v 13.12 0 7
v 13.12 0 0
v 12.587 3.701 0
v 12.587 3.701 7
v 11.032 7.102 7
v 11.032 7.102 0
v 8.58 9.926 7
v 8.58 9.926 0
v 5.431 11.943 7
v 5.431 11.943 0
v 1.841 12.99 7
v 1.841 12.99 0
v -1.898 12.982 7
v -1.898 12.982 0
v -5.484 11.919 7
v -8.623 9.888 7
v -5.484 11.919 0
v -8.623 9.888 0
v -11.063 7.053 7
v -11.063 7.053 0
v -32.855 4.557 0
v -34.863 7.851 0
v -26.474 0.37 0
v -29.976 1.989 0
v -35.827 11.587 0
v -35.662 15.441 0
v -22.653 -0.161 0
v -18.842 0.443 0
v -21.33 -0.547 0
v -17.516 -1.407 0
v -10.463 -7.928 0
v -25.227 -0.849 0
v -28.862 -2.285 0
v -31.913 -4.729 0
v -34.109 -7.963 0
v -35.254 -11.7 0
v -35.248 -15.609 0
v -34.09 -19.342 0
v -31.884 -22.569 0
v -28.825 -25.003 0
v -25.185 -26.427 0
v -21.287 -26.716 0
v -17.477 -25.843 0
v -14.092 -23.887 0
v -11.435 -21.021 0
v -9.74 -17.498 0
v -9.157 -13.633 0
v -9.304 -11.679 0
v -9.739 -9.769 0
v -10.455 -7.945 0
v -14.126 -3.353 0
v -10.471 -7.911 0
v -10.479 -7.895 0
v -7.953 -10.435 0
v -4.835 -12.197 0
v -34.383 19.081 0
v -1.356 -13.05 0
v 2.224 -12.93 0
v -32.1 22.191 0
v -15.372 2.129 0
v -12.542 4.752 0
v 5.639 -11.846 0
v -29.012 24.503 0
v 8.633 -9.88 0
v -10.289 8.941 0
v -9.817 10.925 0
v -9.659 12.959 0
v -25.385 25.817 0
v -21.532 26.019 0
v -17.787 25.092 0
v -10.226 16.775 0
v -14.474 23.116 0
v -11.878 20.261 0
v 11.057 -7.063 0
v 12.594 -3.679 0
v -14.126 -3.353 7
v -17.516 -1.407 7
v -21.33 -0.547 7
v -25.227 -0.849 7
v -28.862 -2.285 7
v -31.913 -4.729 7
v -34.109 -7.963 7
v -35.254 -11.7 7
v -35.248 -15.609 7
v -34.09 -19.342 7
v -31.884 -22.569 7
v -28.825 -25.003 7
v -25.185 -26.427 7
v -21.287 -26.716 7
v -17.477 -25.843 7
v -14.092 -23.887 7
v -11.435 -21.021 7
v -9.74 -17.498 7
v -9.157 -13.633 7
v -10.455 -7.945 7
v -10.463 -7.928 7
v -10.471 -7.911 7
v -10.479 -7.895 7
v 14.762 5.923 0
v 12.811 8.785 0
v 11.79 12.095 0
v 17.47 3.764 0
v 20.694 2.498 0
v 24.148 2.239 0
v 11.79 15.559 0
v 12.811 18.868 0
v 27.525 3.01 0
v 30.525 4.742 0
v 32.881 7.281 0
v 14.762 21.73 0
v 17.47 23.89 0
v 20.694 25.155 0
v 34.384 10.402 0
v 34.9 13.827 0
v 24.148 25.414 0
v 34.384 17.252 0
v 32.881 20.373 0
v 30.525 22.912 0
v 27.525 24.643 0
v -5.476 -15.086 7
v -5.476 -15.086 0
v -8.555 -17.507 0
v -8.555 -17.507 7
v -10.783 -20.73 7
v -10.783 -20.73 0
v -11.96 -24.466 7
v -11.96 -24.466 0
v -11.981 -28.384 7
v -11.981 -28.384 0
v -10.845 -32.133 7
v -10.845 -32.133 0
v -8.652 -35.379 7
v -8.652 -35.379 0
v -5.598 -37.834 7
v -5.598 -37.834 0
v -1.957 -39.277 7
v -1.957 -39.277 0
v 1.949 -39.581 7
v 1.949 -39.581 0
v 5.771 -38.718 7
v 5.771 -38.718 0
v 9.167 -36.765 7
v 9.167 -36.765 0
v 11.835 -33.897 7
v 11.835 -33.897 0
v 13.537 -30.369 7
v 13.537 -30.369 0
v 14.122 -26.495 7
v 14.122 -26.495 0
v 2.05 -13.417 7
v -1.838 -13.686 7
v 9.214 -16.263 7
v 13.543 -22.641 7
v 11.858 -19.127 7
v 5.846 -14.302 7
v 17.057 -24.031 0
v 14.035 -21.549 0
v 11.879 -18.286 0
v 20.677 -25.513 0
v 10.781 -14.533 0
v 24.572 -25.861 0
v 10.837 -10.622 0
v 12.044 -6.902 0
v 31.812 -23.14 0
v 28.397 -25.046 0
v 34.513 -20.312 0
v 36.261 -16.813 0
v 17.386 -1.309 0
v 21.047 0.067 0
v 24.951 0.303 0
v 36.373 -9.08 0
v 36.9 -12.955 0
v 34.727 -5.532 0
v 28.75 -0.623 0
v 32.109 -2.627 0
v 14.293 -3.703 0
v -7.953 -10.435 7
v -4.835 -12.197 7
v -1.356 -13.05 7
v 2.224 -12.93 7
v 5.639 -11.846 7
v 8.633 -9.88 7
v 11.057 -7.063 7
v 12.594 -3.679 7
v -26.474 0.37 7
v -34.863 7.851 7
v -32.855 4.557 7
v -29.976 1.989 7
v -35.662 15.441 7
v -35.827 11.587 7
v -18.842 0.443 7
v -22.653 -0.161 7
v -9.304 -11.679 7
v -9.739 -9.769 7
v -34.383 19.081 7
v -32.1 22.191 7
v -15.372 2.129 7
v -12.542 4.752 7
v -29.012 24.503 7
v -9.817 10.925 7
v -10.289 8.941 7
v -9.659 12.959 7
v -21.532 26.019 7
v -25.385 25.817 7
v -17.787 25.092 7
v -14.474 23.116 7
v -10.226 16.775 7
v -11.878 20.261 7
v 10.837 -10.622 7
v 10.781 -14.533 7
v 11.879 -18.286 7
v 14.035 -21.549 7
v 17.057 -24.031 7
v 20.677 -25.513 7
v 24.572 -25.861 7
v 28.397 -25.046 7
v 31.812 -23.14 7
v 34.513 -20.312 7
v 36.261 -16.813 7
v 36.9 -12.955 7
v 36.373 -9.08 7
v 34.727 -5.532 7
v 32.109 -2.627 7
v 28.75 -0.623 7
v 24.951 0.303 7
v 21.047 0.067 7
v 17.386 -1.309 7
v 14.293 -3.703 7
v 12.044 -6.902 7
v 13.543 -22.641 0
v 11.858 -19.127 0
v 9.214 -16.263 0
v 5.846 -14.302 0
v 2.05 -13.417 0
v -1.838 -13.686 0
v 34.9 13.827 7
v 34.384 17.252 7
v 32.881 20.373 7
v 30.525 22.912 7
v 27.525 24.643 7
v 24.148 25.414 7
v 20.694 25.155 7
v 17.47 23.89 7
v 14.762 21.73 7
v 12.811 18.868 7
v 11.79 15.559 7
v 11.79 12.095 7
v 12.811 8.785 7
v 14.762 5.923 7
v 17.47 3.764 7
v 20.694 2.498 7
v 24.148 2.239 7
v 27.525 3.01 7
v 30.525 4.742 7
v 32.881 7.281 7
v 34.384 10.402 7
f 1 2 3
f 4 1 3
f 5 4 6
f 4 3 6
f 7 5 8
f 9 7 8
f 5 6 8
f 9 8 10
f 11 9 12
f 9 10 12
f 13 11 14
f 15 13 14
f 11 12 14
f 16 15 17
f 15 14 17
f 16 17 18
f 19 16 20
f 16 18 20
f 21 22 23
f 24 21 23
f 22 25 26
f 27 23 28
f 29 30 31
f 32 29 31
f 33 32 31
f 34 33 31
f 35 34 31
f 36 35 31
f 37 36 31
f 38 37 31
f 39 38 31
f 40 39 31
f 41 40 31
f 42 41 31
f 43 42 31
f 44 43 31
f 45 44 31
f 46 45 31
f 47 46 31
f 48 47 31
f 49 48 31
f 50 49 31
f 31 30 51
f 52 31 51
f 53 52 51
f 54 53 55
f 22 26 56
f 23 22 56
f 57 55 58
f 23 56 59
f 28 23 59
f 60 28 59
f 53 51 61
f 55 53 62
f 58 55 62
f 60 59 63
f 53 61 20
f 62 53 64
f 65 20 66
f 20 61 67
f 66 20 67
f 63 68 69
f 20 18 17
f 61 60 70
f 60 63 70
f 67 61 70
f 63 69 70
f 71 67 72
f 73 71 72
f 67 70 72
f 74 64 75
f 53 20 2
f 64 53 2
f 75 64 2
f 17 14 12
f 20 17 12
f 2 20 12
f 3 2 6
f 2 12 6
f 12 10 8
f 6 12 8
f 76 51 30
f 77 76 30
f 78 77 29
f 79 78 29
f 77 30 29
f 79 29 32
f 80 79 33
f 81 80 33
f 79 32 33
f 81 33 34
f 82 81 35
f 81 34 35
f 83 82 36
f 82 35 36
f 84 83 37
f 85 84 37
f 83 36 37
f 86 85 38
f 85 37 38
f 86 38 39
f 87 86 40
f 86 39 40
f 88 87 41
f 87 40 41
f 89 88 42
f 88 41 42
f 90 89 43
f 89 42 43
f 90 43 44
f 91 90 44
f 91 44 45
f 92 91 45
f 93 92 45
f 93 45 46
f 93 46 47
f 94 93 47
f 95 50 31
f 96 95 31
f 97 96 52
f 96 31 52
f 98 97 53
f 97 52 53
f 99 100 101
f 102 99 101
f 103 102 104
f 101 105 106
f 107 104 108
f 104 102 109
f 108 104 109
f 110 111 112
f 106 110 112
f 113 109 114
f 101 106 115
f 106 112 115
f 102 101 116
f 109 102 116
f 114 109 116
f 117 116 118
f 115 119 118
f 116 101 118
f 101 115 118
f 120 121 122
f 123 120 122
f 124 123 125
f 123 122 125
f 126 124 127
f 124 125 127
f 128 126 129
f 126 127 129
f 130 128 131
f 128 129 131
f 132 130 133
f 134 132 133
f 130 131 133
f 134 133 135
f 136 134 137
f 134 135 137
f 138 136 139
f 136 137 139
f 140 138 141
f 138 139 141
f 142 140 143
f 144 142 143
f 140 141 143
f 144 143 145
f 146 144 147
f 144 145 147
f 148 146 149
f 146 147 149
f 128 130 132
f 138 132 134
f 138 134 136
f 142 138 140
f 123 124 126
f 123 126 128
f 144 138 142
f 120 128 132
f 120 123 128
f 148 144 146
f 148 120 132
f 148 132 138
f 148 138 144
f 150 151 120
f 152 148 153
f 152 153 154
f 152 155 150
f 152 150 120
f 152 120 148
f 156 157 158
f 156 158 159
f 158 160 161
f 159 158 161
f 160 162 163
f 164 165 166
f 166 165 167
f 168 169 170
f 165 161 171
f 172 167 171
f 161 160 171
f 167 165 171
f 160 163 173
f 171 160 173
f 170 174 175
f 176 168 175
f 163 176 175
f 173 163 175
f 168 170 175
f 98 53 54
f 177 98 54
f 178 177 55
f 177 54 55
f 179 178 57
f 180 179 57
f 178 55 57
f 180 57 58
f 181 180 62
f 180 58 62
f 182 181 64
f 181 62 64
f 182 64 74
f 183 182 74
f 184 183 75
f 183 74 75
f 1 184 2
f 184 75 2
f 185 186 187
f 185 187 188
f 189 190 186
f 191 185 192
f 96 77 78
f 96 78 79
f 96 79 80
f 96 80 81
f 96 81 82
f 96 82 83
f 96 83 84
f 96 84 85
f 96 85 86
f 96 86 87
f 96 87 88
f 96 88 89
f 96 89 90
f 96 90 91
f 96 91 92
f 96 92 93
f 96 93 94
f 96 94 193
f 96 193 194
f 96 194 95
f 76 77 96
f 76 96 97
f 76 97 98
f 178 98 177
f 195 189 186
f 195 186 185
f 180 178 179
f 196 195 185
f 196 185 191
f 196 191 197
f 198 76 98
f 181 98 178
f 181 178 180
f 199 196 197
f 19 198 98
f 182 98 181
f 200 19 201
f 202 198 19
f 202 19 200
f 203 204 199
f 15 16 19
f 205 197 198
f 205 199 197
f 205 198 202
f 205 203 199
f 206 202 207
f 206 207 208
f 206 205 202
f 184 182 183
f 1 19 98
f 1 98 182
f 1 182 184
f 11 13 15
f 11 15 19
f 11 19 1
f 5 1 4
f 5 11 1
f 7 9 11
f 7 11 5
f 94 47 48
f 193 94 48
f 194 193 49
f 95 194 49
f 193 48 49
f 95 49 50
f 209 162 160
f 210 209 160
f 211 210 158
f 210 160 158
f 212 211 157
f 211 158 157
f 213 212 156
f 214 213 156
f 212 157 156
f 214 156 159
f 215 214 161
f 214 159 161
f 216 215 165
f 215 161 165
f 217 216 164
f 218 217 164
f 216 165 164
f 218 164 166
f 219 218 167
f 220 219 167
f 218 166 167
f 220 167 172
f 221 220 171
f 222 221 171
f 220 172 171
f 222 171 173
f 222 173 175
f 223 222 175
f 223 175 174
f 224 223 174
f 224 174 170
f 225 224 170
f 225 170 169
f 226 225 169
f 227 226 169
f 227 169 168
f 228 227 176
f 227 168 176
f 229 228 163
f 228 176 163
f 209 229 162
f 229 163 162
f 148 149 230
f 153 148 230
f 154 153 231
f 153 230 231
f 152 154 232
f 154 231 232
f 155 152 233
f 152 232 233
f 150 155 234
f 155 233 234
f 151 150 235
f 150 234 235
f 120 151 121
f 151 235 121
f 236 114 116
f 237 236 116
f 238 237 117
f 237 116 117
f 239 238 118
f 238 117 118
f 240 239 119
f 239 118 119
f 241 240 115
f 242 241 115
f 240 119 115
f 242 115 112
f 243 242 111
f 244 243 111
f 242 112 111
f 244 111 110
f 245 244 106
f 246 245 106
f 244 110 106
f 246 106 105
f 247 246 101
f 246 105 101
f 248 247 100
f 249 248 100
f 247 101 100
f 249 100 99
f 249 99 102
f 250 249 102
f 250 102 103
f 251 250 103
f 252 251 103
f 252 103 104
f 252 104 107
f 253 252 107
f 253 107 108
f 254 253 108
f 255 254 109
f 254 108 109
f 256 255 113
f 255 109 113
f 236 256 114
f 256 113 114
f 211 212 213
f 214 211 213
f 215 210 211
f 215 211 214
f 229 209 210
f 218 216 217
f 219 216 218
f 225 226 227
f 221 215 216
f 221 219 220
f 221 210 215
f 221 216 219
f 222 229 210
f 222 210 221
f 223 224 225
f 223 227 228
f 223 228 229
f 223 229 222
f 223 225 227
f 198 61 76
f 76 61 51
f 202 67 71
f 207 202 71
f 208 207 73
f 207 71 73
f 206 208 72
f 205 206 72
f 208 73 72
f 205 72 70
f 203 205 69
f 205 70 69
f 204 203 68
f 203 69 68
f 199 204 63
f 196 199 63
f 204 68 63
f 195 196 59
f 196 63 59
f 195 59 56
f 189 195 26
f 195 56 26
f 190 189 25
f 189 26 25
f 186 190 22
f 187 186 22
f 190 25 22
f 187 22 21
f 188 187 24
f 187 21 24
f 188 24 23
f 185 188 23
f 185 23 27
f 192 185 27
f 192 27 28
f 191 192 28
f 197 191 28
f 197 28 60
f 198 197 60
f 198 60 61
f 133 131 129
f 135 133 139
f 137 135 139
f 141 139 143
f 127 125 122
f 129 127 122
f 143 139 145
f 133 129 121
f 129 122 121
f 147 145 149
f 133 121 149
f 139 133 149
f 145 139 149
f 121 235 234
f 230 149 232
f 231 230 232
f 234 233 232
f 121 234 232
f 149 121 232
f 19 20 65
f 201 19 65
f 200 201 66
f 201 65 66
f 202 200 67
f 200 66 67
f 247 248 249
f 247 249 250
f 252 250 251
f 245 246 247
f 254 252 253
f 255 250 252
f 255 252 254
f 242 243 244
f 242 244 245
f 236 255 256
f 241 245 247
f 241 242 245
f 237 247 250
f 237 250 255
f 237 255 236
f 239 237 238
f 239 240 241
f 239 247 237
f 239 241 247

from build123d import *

# Parameters (mm, degrees)
F0_R     = 11.62
F1_DEPTH = 7


with BuildPart() as f1:
    # F0 (on Top) → F1 (new body)
    with BuildSketch(Plane.XY):
        with BuildLine():
            ThreePointArc((-11.7158977966, 5.9052636537), (-11.4037708203, 6.4875581754), (-11.0627267086, 7.053401858))
            ThreePointArc((-11.0627267086, 7.053401858), (-10.0144759027, 9.9237173319), (-9.6586245052, 12.9586655117))
            ThreePointArc((-9.6586245052, 12.9586655117), (-35.156679229, 17.3081667768), (-12.5424905502, 4.7515977251))
            ThreePointArc((-12.5424905502, 4.7515977251), (-12.1135833585, 5.3172456607), (-11.7158977966, 5.9052636537))
        make_face()
        with Locations((-22.7786245052, 12.9586655117)):
            Circle(F0_R, mode=Mode.SUBTRACT)
        with BuildLine():
            ThreePointArc((-10.4545014127, -7.9452637049), (-10.4667257272, -7.9199237396), (-10.4790043524, -7.8946100462))
            ThreePointArc((-10.4790043524, -7.8946100462), (-11.1907671743, -6.848439972), (-11.7984410246, -5.7385703263))
            ThreePointArc((-11.7984410246, -5.7385703263), (-12.8861513263, -4.4714121996), (-14.1260129293, -3.3526867535))
            ThreePointArc((-14.1260129293, -3.3526867535), (-34.090175665, -19.3422786502), (-9.157445377, -13.6331803725))
            ThreePointArc((-9.157445377, -13.6331803725), (-9.4858187249, -10.7162148955), (-10.4545014127, -7.9452637049))
        make_face()
        with Locations((-22.277445377, -13.6331803725)):
            Circle(F0_R, mode=Mode.SUBTRACT)
        with BuildLine():
            ThreePointArc((-10.4790043524, -7.8946100462), (-1.3555924139, -13.0497804276), (8.6326140868, -9.8798974706))
            ThreePointArc((8.6326140868, -9.8798974706), (11.9455911704, -5.4256107113), (13.12, 0))
            ThreePointArc((13.12, 0), (3.6736511527, 12.5951850804), (-11.0627267086, 7.053401858))
            ThreePointArc((-11.0627267086, 7.053401858), (-11.3748536849, 6.4711073364), (-11.7158977966, 5.9052636537))
            ThreePointArc((-11.7158977966, 5.9052636537), (-13.119670346, 0.0930054432), (-11.7984410246, -5.7385703263))
            ThreePointArc((-11.7984410246, -5.7385703263), (-11.0866782027, -6.7847404005), (-10.4790043524, -7.8946100462))
        make_face()
        with BuildLine():
            ThreePointArc((6.9492298562, -9.3130341139), (-10.3868775609, 5.2093353257), (11.62, 0))
            ThreePointArc((11.62, 0), (10.3868775609, -5.2093353257), (6.9492298562, -9.3130341139))
        make_face(mode=Mode.SUBTRACT)
        with Locations((-22.277445377, -13.6331803725)):
            Circle(F0_R)
        with BuildLine():
            ThreePointArc((6.9492298562, -9.3130341139), (10.3868775609, -5.2093353257), (11.62, 0))
            ThreePointArc((11.62, 0), (-10.3868775609, 5.2093353257), (6.9492298562, -9.3130341139))
        make_face()
        with Locations((-22.7786245052, 12.9586655117)):
            Circle(F0_R)
        with BuildLine():
            ThreePointArc((-14.1260129293, -3.3526867535), (-12.8861513263, -4.4714121996), (-11.7984410246, -5.7385703263))
            ThreePointArc((-11.7984410246, -5.7385703263), (-13.119670346, 0.0930054432), (-11.7158977966, 5.9052636537))
            ThreePointArc((-11.7158977966, 5.9052636537), (-12.1135833585, 5.3172456607), (-12.5424905502, 4.7515977251))
            Line((-12.5424905502, 4.7515977251), (-14.1260129293, -3.3526867535))
        make_face()
        with BuildLine():
            ThreePointArc((-11.7984410246, -5.7385703263), (-11.1907671743, -6.848439972), (-10.4790043524, -7.8946100462))
            ThreePointArc((-10.4790043524, -7.8946100462), (-11.0866782027, -6.7847404005), (-11.7984410246, -5.7385703263))
        make_face()
        with BuildLine():
            ThreePointArc((-11.7158977966, 5.9052636537), (-11.3748536849, 6.4711073364), (-11.0627267086, 7.053401858))
            ThreePointArc((-11.0627267086, 7.053401858), (-11.4037708203, 6.4875581754), (-11.7158977966, 5.9052636537))
        make_face()
    extrude(amount=F1_DEPTH)


with BuildPart() as f1b:
    # F0 (on Top) → F1, piece 2 (new body)
    with BuildSketch(Plane.XY):
        with BuildLine():
            ThreePointArc((14.1223582564, -26.4950694578), (7.6032114793, -15.1565009092), (-5.4756808793, -15.0858885513))
            ThreePointArc((-5.4756808793, -15.0858885513), (-5.5984949664, -37.8336380064), (14.1223582564, -26.4950694578))
        make_face()
        with Locations((1.0023582564, -26.4950694578)):
            Circle(F0_R, mode=Mode.SUBTRACT)
        with Locations((1.0023582564, -26.4950694578)):
            Circle(F0_R)
    extrude(amount=F1_DEPTH)


with BuildPart() as f1c:
    # F0 (on Top) → F1, piece 3 (new body)
    with BuildSketch(Plane.XY):
        with BuildLine():
            ThreePointArc((36.9009827616, -12.7651126588), (24.8560257538, 0.3107690539), (10.8371591999, -10.6222567134))
            ThreePointArc((10.8371591999, -10.6222567134), (22.7059397695, -25.8409943715), (36.9009827616, -12.7651126588))
        make_face()
        with BuildLine():
            ThreePointArc((35.4009827616, -12.7651126588), (22.9503179079, -24.3553842648), (12.2797442245, -11.1080332667))
            ThreePointArc((12.2797442245, -11.1080332667), (24.6116476153, -1.1748410528), (35.4009827616, -12.7651126588))
        make_face(mode=Mode.SUBTRACT)
        with BuildLine():
            ThreePointArc((35.4009827616, -12.7651126588), (24.6116476153, -1.1748410528), (12.2797442245, -11.1080332667))
            ThreePointArc((12.2797442245, -11.1080332667), (22.9503179079, -24.3553842648), (35.4009827616, -12.7651126588))
        make_face()
    extrude(amount=F1_DEPTH)


with BuildPart() as f1d:
    # F0 (on Top) → F1, piece 4 (new body)
    with BuildSketch(Plane.XY):
        with Locations((23.2798036334, 13.8267332255)):
            Circle(F0_R)
    extrude(amount=F1_DEPTH)


solid = Compound([f1.part, f1b.part, f1c.part, f1d.part])
